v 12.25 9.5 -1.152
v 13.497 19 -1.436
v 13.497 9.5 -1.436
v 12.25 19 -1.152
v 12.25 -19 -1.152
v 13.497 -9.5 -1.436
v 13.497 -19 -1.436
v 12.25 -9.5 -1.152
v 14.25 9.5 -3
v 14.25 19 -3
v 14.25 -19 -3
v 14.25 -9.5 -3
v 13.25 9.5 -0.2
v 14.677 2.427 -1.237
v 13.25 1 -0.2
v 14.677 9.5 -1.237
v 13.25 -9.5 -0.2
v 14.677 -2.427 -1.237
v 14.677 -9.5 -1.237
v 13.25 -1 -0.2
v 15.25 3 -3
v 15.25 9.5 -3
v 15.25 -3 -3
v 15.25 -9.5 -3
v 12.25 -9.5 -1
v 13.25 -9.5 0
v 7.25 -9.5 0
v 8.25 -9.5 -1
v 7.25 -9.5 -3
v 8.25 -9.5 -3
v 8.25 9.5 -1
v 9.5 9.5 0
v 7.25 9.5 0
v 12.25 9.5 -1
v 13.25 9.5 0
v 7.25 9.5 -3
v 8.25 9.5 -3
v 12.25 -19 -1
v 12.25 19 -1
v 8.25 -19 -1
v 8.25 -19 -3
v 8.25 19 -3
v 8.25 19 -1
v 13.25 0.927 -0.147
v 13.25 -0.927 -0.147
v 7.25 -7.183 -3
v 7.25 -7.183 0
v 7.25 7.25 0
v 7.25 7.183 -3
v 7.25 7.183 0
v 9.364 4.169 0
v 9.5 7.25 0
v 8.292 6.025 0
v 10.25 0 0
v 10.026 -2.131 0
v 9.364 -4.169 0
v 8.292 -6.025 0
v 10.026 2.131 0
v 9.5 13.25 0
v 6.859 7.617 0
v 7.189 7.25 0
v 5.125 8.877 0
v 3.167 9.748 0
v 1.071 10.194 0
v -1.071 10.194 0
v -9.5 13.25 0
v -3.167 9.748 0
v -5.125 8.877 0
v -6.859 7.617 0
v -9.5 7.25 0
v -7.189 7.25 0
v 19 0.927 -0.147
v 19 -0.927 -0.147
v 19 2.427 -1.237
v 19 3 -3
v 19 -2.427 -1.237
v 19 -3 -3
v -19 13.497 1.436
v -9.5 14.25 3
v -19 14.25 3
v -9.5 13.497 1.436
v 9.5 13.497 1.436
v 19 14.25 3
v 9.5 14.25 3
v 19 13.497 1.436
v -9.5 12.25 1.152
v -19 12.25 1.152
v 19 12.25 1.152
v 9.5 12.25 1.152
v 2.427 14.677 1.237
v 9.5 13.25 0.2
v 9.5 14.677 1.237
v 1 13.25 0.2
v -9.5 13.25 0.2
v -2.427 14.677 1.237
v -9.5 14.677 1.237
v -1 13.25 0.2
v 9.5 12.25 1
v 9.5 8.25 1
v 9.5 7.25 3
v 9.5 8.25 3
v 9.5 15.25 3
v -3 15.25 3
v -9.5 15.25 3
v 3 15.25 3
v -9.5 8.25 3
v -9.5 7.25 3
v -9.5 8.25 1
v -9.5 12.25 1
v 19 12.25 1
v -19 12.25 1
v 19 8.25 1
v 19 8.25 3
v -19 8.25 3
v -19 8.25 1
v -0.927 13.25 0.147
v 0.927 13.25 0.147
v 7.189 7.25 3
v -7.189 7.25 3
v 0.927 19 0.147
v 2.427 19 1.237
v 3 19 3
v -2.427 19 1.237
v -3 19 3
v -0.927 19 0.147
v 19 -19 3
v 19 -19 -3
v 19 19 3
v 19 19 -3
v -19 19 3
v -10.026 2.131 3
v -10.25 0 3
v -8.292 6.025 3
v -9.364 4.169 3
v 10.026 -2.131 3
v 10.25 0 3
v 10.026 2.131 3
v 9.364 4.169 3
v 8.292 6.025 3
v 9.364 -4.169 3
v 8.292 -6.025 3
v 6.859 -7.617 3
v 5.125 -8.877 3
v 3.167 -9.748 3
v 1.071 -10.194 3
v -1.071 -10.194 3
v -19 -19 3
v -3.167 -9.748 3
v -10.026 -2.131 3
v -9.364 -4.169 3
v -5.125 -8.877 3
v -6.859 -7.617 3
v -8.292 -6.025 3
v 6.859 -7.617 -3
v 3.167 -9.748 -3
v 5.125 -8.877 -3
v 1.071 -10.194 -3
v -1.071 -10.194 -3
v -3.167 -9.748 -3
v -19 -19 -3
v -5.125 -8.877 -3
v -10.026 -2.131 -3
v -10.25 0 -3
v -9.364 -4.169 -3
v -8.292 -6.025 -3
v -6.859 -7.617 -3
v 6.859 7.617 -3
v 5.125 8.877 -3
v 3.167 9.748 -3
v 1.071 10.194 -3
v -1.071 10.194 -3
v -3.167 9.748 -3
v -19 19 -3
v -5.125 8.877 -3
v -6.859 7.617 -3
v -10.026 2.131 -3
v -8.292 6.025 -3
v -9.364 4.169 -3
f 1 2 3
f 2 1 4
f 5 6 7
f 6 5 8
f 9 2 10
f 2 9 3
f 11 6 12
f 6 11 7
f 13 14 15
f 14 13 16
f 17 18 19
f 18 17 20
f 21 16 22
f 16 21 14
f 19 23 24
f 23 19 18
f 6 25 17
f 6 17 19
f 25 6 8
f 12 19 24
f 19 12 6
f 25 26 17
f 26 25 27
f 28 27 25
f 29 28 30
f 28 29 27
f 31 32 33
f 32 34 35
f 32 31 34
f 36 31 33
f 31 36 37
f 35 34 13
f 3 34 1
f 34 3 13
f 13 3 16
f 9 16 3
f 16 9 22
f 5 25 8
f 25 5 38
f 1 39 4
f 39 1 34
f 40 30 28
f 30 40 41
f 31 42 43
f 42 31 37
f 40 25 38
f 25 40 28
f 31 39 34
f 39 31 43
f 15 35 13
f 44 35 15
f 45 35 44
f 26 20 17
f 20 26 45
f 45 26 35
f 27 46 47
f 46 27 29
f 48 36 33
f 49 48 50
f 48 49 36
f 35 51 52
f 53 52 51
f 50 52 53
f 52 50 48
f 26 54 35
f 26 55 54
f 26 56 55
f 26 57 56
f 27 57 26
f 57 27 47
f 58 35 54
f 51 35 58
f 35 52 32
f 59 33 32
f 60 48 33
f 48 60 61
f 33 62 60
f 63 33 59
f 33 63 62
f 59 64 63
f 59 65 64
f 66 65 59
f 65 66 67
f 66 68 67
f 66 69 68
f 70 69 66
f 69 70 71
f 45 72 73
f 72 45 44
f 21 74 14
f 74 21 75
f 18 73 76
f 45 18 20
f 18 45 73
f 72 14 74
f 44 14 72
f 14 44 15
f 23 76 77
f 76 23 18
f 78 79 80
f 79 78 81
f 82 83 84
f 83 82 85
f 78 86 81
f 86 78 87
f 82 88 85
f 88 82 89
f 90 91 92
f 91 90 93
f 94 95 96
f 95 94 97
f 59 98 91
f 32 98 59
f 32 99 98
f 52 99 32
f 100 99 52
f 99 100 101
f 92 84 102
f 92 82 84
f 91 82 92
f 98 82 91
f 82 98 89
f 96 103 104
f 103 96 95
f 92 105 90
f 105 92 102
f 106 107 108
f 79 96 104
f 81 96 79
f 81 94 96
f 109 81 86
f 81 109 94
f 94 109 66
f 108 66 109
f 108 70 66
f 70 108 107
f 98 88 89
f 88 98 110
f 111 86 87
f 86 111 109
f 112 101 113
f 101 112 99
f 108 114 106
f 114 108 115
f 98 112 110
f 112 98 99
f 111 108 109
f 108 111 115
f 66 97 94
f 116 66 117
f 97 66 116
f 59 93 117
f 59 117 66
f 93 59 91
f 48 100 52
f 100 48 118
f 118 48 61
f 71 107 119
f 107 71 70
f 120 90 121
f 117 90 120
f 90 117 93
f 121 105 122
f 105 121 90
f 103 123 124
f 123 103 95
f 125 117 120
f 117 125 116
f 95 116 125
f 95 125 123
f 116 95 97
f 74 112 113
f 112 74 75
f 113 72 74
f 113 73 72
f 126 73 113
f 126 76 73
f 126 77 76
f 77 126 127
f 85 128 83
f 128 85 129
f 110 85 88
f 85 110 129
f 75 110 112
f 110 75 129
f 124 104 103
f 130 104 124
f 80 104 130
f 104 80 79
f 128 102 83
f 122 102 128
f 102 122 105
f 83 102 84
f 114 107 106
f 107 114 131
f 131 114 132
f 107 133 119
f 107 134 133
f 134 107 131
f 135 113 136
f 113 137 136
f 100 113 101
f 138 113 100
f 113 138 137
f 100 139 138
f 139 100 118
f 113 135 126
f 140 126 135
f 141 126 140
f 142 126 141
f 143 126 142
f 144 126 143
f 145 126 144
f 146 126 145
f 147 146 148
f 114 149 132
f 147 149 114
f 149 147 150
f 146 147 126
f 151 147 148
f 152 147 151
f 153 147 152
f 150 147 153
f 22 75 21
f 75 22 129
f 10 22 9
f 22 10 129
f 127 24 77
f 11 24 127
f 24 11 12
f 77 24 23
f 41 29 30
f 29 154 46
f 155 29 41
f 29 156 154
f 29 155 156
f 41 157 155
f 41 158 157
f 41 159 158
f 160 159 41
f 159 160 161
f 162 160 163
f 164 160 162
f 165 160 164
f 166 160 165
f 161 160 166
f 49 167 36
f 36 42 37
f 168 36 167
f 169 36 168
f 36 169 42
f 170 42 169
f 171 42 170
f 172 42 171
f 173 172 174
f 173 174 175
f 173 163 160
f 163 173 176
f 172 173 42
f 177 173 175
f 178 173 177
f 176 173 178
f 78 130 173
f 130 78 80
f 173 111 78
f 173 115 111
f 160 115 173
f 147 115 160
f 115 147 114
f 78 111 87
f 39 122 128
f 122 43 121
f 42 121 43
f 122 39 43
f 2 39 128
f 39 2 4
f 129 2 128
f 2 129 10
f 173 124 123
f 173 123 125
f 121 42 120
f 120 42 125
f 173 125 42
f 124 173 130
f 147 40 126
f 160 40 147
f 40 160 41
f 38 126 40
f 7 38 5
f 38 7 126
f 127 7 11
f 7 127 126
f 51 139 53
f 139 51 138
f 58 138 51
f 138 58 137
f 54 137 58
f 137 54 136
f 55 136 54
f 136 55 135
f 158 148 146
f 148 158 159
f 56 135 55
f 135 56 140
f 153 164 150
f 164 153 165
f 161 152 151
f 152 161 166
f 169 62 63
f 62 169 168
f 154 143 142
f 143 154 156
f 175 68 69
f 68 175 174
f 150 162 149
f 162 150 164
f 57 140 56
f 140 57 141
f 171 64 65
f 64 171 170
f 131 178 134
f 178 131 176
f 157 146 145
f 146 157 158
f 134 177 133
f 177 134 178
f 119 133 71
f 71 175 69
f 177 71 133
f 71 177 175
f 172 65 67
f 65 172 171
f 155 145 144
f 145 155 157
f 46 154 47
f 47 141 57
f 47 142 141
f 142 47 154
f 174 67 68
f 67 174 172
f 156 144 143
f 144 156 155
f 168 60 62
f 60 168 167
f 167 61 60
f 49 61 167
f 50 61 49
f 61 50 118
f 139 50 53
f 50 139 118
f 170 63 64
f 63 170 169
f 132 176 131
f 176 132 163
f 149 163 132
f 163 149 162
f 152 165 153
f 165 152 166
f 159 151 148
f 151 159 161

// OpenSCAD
//Radiator Holder
//SatNOGS project

width = 38;
mast = 20.5;
element = 4;

module element_gutter() {
	union() {
		translate([mast/2+element/2,0,0])
			cylinder(d=element,h=width+1,center=true);
		translate([mast/2+element/2,0,0])
			cylinder(d=6,h=width/2,center=true);
		translate([mast/2,0,0])
			cube([element,element,width+1],center=true);
		translate([mast/2,0,0])
			cube([6,6,width/2],center=true);
		rotate(90,[0,1,0])
			translate([0,0,mast/2])
			cylinder(d=6,h=mast,center=true);
	}
}

module holder() {
	difference() {
		cube([width,width,6], center=true);
		cylinder(d=mast,h=width,center=true);
		translate([0,0,-3])
			rotate(90,[1,0,0])
				element_gutter();
		rotate(90,[0,0,1])
			translate([0,0,3])
				rotate(90,[1,0,0])
					element_gutter();
	}
}
	

holder();
